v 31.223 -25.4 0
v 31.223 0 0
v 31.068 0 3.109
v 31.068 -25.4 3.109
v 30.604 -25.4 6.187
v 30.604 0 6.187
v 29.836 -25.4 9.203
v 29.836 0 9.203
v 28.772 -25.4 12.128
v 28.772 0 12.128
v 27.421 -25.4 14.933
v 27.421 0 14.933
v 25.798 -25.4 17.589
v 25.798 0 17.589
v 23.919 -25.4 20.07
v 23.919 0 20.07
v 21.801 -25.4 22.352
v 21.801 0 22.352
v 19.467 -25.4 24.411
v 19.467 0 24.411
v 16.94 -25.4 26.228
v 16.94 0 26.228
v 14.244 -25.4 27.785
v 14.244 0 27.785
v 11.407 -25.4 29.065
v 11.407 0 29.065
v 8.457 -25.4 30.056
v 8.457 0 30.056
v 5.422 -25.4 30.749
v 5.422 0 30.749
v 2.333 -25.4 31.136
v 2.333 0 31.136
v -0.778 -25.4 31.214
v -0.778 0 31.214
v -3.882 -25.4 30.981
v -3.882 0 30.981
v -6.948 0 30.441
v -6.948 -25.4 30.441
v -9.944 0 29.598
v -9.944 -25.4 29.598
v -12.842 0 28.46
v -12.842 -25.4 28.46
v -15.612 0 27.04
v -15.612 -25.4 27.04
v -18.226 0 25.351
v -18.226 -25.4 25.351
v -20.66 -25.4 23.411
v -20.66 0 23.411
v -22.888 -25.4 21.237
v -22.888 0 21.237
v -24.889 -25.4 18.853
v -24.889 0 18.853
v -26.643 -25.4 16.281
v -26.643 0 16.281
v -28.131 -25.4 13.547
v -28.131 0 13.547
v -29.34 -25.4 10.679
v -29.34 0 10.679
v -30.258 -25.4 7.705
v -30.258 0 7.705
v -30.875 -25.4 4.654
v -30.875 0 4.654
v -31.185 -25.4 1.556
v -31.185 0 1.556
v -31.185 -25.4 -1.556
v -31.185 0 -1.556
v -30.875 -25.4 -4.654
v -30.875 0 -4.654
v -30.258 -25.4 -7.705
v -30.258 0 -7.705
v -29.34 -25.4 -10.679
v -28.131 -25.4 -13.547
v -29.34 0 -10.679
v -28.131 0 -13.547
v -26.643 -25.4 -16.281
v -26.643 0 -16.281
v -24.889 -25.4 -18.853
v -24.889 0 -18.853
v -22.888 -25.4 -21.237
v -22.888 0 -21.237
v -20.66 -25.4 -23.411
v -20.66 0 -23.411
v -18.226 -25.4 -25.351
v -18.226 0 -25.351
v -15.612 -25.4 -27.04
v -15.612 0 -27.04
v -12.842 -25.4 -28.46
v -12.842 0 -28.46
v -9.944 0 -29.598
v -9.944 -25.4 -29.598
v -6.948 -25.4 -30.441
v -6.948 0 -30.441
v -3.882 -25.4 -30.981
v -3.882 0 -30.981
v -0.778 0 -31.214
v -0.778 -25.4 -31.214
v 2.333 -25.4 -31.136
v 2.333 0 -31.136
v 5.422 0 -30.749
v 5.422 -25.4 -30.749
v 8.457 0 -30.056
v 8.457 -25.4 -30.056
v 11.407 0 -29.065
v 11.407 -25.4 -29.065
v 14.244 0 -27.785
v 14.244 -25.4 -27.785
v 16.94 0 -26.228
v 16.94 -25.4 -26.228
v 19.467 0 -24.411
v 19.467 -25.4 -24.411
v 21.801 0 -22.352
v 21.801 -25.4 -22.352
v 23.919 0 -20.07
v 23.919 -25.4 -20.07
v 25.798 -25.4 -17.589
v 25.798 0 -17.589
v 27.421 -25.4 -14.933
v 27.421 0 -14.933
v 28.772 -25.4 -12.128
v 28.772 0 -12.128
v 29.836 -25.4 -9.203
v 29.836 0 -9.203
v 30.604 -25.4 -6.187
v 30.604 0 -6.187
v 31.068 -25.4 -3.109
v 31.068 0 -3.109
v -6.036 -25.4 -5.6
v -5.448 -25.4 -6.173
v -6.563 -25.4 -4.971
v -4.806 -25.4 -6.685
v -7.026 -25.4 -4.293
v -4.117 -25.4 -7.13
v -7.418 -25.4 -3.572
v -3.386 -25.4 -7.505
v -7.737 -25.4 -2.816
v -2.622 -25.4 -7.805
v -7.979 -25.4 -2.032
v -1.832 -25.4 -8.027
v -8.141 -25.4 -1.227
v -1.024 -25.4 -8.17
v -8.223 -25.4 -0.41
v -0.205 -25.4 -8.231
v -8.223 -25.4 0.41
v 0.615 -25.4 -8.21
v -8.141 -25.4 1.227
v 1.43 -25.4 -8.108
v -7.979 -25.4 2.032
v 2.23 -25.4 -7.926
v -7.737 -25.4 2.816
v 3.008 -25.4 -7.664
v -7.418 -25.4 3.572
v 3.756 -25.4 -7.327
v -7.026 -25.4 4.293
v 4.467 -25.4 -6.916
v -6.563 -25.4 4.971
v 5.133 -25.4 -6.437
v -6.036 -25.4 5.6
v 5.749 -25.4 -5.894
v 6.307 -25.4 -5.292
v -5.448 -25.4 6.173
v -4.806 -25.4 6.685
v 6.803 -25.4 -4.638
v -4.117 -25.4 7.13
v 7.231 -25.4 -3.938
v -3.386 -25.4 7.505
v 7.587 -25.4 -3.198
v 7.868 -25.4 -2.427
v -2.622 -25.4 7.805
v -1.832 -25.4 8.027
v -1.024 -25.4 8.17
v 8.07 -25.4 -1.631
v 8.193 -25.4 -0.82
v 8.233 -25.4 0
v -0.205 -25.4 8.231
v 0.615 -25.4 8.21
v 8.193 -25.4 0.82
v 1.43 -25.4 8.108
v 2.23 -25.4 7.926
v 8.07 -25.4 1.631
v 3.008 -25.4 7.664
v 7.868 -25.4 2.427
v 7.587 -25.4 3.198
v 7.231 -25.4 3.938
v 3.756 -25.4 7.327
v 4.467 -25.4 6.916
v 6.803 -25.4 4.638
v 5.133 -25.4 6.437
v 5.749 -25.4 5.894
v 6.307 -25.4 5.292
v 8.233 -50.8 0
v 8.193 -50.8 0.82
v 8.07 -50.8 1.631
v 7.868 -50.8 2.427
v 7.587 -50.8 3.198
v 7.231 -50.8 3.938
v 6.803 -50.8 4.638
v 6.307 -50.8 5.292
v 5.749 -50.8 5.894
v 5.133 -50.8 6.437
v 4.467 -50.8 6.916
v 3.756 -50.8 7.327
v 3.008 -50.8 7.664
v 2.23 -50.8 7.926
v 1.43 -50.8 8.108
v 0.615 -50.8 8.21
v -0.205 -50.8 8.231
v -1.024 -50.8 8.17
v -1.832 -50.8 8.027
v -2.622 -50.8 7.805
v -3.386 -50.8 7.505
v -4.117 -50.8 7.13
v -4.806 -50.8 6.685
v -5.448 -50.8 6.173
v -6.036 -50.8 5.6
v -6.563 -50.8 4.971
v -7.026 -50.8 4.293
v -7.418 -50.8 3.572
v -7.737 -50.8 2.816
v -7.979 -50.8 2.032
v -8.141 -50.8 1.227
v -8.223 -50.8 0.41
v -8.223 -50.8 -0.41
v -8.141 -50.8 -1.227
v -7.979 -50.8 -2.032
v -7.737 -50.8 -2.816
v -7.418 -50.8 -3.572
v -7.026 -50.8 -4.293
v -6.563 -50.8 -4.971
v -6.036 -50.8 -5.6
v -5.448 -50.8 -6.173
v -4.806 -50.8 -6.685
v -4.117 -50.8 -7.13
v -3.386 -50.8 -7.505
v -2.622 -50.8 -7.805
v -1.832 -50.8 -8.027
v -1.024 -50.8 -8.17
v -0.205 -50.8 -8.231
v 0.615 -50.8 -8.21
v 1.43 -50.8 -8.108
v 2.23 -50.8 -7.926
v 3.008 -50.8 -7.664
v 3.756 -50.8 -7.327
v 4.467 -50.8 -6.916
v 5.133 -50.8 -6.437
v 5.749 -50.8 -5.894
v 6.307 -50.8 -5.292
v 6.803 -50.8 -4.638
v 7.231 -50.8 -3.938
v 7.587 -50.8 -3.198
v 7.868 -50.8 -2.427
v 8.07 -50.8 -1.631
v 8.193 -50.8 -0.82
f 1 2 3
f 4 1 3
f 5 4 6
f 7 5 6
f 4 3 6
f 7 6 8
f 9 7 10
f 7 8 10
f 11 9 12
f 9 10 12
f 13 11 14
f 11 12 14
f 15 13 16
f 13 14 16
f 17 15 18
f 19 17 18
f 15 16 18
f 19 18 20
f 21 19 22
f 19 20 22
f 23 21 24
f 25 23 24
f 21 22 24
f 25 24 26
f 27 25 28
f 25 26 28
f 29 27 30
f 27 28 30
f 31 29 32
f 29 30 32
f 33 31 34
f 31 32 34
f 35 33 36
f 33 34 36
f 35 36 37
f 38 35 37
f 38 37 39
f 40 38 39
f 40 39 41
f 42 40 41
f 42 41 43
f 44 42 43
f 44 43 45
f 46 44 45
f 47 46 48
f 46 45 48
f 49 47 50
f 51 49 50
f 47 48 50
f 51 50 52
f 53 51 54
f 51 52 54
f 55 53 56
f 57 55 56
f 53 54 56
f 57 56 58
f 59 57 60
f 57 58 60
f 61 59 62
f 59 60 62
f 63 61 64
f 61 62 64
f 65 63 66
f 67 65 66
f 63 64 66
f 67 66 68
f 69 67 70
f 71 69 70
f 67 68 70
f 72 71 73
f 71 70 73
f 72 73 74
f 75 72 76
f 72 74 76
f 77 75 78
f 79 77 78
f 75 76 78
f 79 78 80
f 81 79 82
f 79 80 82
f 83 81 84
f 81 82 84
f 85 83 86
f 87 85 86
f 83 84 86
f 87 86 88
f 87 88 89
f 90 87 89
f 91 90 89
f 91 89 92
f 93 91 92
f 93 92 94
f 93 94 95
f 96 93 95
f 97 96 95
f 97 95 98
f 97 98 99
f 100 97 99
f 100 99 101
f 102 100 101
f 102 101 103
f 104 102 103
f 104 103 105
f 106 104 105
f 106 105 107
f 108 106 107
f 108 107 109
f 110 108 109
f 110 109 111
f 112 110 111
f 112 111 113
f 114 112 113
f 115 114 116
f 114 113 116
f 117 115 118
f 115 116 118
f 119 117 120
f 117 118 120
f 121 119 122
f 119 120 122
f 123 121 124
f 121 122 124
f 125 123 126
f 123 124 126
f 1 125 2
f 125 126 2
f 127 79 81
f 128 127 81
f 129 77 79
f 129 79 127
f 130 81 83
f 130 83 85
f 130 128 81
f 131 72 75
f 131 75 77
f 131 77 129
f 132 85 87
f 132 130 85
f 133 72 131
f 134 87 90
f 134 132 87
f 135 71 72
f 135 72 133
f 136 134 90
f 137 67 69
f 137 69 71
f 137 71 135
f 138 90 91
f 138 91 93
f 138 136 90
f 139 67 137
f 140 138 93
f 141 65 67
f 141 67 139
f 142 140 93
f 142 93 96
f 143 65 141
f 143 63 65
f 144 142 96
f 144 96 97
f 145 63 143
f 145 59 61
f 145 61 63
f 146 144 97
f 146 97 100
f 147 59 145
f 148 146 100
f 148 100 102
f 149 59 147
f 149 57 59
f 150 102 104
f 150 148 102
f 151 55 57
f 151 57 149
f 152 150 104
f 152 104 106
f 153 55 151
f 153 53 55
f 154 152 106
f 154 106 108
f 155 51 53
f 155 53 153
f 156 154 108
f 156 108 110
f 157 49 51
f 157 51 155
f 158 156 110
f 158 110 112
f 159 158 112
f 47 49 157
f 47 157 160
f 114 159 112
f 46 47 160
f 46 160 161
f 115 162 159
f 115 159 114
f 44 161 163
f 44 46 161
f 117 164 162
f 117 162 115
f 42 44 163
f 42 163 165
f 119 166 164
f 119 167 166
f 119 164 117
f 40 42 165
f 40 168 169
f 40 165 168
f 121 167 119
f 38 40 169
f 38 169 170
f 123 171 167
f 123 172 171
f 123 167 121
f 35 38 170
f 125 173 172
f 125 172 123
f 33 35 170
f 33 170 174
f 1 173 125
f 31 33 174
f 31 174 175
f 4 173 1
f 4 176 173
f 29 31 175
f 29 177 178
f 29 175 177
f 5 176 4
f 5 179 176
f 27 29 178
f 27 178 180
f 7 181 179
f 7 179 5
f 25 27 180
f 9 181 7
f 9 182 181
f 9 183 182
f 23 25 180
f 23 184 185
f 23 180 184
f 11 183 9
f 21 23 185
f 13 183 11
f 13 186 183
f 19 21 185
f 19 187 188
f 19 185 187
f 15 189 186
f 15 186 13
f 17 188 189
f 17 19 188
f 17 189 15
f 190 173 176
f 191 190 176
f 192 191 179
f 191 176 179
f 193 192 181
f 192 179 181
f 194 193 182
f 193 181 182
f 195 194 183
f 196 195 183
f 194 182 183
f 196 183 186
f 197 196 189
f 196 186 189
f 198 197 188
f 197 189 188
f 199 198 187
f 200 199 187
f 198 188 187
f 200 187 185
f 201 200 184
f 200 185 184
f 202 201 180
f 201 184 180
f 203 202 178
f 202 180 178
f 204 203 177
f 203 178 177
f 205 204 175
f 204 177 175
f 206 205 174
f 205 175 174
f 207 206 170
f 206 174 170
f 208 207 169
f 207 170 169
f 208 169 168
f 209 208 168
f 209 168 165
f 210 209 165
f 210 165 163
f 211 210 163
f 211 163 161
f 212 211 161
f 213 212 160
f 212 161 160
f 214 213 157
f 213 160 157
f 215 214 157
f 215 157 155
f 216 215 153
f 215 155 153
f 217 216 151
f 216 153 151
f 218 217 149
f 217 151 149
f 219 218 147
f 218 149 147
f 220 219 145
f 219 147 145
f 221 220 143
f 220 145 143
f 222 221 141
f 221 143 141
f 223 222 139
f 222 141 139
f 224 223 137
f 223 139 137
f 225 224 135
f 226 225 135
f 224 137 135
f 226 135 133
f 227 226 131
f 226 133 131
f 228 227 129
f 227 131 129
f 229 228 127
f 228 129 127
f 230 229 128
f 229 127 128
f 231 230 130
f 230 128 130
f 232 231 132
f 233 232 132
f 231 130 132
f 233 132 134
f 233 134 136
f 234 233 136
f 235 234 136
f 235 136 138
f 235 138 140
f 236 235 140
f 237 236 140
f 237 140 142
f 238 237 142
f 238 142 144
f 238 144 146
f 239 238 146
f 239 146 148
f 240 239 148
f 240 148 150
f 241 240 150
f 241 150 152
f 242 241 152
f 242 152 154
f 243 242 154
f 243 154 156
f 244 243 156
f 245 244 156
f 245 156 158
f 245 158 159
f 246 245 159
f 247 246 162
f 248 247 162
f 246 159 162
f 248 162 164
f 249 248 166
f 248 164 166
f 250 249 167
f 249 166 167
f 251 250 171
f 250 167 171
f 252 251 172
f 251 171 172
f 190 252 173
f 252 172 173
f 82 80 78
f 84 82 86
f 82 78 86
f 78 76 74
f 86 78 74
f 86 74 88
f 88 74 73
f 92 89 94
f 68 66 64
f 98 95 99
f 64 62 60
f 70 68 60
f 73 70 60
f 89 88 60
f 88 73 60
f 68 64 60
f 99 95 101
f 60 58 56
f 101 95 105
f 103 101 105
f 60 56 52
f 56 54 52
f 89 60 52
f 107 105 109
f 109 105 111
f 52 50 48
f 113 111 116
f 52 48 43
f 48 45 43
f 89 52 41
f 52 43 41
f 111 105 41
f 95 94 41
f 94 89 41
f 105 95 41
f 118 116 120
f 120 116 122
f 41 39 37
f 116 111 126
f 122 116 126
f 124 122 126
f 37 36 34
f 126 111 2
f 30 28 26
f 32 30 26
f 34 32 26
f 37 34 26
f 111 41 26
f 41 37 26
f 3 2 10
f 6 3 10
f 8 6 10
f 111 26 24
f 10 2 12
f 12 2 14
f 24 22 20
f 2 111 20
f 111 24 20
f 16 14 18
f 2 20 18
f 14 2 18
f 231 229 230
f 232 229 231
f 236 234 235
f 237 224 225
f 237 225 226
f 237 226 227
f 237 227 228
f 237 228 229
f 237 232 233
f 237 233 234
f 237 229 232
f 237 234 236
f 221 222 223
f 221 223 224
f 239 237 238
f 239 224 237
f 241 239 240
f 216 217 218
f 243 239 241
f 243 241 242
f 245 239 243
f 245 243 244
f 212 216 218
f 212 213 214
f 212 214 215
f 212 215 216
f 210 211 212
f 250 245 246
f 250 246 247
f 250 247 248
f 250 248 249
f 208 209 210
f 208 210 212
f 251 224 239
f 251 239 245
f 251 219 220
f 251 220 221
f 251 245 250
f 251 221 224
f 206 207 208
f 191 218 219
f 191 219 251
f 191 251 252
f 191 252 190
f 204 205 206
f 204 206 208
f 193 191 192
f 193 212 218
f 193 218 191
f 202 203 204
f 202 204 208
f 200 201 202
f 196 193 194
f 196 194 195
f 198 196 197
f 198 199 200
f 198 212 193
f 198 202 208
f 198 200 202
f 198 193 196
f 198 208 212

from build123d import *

# Parameters (mm, degrees)
F0_R      = 31.223387
F1_DEPTH  = 25.4
F2_R      = 8.233422
F3_DEPTH  = 25.4
F3_FACE_R = 8.233422
F4_DEPTH  = 25.4


with BuildPart() as f1:
    # F0 (on Front) → F1 (new body)
    with BuildSketch(Plane.XZ):
        Circle(F0_R)
    extrude(amount=F1_DEPTH)

    # F2 (on face) → F3 (join)
    with BuildSketch(Plane.XZ.offset(25.4)):
        Circle(F2_R)
    extrude(amount=F3_DEPTH)

    # F3_face (on face) → F4 (join)
    with BuildSketch(Plane.XZ.offset(50.8)):
        Circle(F3_FACE_R)
    extrude(amount=-F4_DEPTH)


solid = f1.part
